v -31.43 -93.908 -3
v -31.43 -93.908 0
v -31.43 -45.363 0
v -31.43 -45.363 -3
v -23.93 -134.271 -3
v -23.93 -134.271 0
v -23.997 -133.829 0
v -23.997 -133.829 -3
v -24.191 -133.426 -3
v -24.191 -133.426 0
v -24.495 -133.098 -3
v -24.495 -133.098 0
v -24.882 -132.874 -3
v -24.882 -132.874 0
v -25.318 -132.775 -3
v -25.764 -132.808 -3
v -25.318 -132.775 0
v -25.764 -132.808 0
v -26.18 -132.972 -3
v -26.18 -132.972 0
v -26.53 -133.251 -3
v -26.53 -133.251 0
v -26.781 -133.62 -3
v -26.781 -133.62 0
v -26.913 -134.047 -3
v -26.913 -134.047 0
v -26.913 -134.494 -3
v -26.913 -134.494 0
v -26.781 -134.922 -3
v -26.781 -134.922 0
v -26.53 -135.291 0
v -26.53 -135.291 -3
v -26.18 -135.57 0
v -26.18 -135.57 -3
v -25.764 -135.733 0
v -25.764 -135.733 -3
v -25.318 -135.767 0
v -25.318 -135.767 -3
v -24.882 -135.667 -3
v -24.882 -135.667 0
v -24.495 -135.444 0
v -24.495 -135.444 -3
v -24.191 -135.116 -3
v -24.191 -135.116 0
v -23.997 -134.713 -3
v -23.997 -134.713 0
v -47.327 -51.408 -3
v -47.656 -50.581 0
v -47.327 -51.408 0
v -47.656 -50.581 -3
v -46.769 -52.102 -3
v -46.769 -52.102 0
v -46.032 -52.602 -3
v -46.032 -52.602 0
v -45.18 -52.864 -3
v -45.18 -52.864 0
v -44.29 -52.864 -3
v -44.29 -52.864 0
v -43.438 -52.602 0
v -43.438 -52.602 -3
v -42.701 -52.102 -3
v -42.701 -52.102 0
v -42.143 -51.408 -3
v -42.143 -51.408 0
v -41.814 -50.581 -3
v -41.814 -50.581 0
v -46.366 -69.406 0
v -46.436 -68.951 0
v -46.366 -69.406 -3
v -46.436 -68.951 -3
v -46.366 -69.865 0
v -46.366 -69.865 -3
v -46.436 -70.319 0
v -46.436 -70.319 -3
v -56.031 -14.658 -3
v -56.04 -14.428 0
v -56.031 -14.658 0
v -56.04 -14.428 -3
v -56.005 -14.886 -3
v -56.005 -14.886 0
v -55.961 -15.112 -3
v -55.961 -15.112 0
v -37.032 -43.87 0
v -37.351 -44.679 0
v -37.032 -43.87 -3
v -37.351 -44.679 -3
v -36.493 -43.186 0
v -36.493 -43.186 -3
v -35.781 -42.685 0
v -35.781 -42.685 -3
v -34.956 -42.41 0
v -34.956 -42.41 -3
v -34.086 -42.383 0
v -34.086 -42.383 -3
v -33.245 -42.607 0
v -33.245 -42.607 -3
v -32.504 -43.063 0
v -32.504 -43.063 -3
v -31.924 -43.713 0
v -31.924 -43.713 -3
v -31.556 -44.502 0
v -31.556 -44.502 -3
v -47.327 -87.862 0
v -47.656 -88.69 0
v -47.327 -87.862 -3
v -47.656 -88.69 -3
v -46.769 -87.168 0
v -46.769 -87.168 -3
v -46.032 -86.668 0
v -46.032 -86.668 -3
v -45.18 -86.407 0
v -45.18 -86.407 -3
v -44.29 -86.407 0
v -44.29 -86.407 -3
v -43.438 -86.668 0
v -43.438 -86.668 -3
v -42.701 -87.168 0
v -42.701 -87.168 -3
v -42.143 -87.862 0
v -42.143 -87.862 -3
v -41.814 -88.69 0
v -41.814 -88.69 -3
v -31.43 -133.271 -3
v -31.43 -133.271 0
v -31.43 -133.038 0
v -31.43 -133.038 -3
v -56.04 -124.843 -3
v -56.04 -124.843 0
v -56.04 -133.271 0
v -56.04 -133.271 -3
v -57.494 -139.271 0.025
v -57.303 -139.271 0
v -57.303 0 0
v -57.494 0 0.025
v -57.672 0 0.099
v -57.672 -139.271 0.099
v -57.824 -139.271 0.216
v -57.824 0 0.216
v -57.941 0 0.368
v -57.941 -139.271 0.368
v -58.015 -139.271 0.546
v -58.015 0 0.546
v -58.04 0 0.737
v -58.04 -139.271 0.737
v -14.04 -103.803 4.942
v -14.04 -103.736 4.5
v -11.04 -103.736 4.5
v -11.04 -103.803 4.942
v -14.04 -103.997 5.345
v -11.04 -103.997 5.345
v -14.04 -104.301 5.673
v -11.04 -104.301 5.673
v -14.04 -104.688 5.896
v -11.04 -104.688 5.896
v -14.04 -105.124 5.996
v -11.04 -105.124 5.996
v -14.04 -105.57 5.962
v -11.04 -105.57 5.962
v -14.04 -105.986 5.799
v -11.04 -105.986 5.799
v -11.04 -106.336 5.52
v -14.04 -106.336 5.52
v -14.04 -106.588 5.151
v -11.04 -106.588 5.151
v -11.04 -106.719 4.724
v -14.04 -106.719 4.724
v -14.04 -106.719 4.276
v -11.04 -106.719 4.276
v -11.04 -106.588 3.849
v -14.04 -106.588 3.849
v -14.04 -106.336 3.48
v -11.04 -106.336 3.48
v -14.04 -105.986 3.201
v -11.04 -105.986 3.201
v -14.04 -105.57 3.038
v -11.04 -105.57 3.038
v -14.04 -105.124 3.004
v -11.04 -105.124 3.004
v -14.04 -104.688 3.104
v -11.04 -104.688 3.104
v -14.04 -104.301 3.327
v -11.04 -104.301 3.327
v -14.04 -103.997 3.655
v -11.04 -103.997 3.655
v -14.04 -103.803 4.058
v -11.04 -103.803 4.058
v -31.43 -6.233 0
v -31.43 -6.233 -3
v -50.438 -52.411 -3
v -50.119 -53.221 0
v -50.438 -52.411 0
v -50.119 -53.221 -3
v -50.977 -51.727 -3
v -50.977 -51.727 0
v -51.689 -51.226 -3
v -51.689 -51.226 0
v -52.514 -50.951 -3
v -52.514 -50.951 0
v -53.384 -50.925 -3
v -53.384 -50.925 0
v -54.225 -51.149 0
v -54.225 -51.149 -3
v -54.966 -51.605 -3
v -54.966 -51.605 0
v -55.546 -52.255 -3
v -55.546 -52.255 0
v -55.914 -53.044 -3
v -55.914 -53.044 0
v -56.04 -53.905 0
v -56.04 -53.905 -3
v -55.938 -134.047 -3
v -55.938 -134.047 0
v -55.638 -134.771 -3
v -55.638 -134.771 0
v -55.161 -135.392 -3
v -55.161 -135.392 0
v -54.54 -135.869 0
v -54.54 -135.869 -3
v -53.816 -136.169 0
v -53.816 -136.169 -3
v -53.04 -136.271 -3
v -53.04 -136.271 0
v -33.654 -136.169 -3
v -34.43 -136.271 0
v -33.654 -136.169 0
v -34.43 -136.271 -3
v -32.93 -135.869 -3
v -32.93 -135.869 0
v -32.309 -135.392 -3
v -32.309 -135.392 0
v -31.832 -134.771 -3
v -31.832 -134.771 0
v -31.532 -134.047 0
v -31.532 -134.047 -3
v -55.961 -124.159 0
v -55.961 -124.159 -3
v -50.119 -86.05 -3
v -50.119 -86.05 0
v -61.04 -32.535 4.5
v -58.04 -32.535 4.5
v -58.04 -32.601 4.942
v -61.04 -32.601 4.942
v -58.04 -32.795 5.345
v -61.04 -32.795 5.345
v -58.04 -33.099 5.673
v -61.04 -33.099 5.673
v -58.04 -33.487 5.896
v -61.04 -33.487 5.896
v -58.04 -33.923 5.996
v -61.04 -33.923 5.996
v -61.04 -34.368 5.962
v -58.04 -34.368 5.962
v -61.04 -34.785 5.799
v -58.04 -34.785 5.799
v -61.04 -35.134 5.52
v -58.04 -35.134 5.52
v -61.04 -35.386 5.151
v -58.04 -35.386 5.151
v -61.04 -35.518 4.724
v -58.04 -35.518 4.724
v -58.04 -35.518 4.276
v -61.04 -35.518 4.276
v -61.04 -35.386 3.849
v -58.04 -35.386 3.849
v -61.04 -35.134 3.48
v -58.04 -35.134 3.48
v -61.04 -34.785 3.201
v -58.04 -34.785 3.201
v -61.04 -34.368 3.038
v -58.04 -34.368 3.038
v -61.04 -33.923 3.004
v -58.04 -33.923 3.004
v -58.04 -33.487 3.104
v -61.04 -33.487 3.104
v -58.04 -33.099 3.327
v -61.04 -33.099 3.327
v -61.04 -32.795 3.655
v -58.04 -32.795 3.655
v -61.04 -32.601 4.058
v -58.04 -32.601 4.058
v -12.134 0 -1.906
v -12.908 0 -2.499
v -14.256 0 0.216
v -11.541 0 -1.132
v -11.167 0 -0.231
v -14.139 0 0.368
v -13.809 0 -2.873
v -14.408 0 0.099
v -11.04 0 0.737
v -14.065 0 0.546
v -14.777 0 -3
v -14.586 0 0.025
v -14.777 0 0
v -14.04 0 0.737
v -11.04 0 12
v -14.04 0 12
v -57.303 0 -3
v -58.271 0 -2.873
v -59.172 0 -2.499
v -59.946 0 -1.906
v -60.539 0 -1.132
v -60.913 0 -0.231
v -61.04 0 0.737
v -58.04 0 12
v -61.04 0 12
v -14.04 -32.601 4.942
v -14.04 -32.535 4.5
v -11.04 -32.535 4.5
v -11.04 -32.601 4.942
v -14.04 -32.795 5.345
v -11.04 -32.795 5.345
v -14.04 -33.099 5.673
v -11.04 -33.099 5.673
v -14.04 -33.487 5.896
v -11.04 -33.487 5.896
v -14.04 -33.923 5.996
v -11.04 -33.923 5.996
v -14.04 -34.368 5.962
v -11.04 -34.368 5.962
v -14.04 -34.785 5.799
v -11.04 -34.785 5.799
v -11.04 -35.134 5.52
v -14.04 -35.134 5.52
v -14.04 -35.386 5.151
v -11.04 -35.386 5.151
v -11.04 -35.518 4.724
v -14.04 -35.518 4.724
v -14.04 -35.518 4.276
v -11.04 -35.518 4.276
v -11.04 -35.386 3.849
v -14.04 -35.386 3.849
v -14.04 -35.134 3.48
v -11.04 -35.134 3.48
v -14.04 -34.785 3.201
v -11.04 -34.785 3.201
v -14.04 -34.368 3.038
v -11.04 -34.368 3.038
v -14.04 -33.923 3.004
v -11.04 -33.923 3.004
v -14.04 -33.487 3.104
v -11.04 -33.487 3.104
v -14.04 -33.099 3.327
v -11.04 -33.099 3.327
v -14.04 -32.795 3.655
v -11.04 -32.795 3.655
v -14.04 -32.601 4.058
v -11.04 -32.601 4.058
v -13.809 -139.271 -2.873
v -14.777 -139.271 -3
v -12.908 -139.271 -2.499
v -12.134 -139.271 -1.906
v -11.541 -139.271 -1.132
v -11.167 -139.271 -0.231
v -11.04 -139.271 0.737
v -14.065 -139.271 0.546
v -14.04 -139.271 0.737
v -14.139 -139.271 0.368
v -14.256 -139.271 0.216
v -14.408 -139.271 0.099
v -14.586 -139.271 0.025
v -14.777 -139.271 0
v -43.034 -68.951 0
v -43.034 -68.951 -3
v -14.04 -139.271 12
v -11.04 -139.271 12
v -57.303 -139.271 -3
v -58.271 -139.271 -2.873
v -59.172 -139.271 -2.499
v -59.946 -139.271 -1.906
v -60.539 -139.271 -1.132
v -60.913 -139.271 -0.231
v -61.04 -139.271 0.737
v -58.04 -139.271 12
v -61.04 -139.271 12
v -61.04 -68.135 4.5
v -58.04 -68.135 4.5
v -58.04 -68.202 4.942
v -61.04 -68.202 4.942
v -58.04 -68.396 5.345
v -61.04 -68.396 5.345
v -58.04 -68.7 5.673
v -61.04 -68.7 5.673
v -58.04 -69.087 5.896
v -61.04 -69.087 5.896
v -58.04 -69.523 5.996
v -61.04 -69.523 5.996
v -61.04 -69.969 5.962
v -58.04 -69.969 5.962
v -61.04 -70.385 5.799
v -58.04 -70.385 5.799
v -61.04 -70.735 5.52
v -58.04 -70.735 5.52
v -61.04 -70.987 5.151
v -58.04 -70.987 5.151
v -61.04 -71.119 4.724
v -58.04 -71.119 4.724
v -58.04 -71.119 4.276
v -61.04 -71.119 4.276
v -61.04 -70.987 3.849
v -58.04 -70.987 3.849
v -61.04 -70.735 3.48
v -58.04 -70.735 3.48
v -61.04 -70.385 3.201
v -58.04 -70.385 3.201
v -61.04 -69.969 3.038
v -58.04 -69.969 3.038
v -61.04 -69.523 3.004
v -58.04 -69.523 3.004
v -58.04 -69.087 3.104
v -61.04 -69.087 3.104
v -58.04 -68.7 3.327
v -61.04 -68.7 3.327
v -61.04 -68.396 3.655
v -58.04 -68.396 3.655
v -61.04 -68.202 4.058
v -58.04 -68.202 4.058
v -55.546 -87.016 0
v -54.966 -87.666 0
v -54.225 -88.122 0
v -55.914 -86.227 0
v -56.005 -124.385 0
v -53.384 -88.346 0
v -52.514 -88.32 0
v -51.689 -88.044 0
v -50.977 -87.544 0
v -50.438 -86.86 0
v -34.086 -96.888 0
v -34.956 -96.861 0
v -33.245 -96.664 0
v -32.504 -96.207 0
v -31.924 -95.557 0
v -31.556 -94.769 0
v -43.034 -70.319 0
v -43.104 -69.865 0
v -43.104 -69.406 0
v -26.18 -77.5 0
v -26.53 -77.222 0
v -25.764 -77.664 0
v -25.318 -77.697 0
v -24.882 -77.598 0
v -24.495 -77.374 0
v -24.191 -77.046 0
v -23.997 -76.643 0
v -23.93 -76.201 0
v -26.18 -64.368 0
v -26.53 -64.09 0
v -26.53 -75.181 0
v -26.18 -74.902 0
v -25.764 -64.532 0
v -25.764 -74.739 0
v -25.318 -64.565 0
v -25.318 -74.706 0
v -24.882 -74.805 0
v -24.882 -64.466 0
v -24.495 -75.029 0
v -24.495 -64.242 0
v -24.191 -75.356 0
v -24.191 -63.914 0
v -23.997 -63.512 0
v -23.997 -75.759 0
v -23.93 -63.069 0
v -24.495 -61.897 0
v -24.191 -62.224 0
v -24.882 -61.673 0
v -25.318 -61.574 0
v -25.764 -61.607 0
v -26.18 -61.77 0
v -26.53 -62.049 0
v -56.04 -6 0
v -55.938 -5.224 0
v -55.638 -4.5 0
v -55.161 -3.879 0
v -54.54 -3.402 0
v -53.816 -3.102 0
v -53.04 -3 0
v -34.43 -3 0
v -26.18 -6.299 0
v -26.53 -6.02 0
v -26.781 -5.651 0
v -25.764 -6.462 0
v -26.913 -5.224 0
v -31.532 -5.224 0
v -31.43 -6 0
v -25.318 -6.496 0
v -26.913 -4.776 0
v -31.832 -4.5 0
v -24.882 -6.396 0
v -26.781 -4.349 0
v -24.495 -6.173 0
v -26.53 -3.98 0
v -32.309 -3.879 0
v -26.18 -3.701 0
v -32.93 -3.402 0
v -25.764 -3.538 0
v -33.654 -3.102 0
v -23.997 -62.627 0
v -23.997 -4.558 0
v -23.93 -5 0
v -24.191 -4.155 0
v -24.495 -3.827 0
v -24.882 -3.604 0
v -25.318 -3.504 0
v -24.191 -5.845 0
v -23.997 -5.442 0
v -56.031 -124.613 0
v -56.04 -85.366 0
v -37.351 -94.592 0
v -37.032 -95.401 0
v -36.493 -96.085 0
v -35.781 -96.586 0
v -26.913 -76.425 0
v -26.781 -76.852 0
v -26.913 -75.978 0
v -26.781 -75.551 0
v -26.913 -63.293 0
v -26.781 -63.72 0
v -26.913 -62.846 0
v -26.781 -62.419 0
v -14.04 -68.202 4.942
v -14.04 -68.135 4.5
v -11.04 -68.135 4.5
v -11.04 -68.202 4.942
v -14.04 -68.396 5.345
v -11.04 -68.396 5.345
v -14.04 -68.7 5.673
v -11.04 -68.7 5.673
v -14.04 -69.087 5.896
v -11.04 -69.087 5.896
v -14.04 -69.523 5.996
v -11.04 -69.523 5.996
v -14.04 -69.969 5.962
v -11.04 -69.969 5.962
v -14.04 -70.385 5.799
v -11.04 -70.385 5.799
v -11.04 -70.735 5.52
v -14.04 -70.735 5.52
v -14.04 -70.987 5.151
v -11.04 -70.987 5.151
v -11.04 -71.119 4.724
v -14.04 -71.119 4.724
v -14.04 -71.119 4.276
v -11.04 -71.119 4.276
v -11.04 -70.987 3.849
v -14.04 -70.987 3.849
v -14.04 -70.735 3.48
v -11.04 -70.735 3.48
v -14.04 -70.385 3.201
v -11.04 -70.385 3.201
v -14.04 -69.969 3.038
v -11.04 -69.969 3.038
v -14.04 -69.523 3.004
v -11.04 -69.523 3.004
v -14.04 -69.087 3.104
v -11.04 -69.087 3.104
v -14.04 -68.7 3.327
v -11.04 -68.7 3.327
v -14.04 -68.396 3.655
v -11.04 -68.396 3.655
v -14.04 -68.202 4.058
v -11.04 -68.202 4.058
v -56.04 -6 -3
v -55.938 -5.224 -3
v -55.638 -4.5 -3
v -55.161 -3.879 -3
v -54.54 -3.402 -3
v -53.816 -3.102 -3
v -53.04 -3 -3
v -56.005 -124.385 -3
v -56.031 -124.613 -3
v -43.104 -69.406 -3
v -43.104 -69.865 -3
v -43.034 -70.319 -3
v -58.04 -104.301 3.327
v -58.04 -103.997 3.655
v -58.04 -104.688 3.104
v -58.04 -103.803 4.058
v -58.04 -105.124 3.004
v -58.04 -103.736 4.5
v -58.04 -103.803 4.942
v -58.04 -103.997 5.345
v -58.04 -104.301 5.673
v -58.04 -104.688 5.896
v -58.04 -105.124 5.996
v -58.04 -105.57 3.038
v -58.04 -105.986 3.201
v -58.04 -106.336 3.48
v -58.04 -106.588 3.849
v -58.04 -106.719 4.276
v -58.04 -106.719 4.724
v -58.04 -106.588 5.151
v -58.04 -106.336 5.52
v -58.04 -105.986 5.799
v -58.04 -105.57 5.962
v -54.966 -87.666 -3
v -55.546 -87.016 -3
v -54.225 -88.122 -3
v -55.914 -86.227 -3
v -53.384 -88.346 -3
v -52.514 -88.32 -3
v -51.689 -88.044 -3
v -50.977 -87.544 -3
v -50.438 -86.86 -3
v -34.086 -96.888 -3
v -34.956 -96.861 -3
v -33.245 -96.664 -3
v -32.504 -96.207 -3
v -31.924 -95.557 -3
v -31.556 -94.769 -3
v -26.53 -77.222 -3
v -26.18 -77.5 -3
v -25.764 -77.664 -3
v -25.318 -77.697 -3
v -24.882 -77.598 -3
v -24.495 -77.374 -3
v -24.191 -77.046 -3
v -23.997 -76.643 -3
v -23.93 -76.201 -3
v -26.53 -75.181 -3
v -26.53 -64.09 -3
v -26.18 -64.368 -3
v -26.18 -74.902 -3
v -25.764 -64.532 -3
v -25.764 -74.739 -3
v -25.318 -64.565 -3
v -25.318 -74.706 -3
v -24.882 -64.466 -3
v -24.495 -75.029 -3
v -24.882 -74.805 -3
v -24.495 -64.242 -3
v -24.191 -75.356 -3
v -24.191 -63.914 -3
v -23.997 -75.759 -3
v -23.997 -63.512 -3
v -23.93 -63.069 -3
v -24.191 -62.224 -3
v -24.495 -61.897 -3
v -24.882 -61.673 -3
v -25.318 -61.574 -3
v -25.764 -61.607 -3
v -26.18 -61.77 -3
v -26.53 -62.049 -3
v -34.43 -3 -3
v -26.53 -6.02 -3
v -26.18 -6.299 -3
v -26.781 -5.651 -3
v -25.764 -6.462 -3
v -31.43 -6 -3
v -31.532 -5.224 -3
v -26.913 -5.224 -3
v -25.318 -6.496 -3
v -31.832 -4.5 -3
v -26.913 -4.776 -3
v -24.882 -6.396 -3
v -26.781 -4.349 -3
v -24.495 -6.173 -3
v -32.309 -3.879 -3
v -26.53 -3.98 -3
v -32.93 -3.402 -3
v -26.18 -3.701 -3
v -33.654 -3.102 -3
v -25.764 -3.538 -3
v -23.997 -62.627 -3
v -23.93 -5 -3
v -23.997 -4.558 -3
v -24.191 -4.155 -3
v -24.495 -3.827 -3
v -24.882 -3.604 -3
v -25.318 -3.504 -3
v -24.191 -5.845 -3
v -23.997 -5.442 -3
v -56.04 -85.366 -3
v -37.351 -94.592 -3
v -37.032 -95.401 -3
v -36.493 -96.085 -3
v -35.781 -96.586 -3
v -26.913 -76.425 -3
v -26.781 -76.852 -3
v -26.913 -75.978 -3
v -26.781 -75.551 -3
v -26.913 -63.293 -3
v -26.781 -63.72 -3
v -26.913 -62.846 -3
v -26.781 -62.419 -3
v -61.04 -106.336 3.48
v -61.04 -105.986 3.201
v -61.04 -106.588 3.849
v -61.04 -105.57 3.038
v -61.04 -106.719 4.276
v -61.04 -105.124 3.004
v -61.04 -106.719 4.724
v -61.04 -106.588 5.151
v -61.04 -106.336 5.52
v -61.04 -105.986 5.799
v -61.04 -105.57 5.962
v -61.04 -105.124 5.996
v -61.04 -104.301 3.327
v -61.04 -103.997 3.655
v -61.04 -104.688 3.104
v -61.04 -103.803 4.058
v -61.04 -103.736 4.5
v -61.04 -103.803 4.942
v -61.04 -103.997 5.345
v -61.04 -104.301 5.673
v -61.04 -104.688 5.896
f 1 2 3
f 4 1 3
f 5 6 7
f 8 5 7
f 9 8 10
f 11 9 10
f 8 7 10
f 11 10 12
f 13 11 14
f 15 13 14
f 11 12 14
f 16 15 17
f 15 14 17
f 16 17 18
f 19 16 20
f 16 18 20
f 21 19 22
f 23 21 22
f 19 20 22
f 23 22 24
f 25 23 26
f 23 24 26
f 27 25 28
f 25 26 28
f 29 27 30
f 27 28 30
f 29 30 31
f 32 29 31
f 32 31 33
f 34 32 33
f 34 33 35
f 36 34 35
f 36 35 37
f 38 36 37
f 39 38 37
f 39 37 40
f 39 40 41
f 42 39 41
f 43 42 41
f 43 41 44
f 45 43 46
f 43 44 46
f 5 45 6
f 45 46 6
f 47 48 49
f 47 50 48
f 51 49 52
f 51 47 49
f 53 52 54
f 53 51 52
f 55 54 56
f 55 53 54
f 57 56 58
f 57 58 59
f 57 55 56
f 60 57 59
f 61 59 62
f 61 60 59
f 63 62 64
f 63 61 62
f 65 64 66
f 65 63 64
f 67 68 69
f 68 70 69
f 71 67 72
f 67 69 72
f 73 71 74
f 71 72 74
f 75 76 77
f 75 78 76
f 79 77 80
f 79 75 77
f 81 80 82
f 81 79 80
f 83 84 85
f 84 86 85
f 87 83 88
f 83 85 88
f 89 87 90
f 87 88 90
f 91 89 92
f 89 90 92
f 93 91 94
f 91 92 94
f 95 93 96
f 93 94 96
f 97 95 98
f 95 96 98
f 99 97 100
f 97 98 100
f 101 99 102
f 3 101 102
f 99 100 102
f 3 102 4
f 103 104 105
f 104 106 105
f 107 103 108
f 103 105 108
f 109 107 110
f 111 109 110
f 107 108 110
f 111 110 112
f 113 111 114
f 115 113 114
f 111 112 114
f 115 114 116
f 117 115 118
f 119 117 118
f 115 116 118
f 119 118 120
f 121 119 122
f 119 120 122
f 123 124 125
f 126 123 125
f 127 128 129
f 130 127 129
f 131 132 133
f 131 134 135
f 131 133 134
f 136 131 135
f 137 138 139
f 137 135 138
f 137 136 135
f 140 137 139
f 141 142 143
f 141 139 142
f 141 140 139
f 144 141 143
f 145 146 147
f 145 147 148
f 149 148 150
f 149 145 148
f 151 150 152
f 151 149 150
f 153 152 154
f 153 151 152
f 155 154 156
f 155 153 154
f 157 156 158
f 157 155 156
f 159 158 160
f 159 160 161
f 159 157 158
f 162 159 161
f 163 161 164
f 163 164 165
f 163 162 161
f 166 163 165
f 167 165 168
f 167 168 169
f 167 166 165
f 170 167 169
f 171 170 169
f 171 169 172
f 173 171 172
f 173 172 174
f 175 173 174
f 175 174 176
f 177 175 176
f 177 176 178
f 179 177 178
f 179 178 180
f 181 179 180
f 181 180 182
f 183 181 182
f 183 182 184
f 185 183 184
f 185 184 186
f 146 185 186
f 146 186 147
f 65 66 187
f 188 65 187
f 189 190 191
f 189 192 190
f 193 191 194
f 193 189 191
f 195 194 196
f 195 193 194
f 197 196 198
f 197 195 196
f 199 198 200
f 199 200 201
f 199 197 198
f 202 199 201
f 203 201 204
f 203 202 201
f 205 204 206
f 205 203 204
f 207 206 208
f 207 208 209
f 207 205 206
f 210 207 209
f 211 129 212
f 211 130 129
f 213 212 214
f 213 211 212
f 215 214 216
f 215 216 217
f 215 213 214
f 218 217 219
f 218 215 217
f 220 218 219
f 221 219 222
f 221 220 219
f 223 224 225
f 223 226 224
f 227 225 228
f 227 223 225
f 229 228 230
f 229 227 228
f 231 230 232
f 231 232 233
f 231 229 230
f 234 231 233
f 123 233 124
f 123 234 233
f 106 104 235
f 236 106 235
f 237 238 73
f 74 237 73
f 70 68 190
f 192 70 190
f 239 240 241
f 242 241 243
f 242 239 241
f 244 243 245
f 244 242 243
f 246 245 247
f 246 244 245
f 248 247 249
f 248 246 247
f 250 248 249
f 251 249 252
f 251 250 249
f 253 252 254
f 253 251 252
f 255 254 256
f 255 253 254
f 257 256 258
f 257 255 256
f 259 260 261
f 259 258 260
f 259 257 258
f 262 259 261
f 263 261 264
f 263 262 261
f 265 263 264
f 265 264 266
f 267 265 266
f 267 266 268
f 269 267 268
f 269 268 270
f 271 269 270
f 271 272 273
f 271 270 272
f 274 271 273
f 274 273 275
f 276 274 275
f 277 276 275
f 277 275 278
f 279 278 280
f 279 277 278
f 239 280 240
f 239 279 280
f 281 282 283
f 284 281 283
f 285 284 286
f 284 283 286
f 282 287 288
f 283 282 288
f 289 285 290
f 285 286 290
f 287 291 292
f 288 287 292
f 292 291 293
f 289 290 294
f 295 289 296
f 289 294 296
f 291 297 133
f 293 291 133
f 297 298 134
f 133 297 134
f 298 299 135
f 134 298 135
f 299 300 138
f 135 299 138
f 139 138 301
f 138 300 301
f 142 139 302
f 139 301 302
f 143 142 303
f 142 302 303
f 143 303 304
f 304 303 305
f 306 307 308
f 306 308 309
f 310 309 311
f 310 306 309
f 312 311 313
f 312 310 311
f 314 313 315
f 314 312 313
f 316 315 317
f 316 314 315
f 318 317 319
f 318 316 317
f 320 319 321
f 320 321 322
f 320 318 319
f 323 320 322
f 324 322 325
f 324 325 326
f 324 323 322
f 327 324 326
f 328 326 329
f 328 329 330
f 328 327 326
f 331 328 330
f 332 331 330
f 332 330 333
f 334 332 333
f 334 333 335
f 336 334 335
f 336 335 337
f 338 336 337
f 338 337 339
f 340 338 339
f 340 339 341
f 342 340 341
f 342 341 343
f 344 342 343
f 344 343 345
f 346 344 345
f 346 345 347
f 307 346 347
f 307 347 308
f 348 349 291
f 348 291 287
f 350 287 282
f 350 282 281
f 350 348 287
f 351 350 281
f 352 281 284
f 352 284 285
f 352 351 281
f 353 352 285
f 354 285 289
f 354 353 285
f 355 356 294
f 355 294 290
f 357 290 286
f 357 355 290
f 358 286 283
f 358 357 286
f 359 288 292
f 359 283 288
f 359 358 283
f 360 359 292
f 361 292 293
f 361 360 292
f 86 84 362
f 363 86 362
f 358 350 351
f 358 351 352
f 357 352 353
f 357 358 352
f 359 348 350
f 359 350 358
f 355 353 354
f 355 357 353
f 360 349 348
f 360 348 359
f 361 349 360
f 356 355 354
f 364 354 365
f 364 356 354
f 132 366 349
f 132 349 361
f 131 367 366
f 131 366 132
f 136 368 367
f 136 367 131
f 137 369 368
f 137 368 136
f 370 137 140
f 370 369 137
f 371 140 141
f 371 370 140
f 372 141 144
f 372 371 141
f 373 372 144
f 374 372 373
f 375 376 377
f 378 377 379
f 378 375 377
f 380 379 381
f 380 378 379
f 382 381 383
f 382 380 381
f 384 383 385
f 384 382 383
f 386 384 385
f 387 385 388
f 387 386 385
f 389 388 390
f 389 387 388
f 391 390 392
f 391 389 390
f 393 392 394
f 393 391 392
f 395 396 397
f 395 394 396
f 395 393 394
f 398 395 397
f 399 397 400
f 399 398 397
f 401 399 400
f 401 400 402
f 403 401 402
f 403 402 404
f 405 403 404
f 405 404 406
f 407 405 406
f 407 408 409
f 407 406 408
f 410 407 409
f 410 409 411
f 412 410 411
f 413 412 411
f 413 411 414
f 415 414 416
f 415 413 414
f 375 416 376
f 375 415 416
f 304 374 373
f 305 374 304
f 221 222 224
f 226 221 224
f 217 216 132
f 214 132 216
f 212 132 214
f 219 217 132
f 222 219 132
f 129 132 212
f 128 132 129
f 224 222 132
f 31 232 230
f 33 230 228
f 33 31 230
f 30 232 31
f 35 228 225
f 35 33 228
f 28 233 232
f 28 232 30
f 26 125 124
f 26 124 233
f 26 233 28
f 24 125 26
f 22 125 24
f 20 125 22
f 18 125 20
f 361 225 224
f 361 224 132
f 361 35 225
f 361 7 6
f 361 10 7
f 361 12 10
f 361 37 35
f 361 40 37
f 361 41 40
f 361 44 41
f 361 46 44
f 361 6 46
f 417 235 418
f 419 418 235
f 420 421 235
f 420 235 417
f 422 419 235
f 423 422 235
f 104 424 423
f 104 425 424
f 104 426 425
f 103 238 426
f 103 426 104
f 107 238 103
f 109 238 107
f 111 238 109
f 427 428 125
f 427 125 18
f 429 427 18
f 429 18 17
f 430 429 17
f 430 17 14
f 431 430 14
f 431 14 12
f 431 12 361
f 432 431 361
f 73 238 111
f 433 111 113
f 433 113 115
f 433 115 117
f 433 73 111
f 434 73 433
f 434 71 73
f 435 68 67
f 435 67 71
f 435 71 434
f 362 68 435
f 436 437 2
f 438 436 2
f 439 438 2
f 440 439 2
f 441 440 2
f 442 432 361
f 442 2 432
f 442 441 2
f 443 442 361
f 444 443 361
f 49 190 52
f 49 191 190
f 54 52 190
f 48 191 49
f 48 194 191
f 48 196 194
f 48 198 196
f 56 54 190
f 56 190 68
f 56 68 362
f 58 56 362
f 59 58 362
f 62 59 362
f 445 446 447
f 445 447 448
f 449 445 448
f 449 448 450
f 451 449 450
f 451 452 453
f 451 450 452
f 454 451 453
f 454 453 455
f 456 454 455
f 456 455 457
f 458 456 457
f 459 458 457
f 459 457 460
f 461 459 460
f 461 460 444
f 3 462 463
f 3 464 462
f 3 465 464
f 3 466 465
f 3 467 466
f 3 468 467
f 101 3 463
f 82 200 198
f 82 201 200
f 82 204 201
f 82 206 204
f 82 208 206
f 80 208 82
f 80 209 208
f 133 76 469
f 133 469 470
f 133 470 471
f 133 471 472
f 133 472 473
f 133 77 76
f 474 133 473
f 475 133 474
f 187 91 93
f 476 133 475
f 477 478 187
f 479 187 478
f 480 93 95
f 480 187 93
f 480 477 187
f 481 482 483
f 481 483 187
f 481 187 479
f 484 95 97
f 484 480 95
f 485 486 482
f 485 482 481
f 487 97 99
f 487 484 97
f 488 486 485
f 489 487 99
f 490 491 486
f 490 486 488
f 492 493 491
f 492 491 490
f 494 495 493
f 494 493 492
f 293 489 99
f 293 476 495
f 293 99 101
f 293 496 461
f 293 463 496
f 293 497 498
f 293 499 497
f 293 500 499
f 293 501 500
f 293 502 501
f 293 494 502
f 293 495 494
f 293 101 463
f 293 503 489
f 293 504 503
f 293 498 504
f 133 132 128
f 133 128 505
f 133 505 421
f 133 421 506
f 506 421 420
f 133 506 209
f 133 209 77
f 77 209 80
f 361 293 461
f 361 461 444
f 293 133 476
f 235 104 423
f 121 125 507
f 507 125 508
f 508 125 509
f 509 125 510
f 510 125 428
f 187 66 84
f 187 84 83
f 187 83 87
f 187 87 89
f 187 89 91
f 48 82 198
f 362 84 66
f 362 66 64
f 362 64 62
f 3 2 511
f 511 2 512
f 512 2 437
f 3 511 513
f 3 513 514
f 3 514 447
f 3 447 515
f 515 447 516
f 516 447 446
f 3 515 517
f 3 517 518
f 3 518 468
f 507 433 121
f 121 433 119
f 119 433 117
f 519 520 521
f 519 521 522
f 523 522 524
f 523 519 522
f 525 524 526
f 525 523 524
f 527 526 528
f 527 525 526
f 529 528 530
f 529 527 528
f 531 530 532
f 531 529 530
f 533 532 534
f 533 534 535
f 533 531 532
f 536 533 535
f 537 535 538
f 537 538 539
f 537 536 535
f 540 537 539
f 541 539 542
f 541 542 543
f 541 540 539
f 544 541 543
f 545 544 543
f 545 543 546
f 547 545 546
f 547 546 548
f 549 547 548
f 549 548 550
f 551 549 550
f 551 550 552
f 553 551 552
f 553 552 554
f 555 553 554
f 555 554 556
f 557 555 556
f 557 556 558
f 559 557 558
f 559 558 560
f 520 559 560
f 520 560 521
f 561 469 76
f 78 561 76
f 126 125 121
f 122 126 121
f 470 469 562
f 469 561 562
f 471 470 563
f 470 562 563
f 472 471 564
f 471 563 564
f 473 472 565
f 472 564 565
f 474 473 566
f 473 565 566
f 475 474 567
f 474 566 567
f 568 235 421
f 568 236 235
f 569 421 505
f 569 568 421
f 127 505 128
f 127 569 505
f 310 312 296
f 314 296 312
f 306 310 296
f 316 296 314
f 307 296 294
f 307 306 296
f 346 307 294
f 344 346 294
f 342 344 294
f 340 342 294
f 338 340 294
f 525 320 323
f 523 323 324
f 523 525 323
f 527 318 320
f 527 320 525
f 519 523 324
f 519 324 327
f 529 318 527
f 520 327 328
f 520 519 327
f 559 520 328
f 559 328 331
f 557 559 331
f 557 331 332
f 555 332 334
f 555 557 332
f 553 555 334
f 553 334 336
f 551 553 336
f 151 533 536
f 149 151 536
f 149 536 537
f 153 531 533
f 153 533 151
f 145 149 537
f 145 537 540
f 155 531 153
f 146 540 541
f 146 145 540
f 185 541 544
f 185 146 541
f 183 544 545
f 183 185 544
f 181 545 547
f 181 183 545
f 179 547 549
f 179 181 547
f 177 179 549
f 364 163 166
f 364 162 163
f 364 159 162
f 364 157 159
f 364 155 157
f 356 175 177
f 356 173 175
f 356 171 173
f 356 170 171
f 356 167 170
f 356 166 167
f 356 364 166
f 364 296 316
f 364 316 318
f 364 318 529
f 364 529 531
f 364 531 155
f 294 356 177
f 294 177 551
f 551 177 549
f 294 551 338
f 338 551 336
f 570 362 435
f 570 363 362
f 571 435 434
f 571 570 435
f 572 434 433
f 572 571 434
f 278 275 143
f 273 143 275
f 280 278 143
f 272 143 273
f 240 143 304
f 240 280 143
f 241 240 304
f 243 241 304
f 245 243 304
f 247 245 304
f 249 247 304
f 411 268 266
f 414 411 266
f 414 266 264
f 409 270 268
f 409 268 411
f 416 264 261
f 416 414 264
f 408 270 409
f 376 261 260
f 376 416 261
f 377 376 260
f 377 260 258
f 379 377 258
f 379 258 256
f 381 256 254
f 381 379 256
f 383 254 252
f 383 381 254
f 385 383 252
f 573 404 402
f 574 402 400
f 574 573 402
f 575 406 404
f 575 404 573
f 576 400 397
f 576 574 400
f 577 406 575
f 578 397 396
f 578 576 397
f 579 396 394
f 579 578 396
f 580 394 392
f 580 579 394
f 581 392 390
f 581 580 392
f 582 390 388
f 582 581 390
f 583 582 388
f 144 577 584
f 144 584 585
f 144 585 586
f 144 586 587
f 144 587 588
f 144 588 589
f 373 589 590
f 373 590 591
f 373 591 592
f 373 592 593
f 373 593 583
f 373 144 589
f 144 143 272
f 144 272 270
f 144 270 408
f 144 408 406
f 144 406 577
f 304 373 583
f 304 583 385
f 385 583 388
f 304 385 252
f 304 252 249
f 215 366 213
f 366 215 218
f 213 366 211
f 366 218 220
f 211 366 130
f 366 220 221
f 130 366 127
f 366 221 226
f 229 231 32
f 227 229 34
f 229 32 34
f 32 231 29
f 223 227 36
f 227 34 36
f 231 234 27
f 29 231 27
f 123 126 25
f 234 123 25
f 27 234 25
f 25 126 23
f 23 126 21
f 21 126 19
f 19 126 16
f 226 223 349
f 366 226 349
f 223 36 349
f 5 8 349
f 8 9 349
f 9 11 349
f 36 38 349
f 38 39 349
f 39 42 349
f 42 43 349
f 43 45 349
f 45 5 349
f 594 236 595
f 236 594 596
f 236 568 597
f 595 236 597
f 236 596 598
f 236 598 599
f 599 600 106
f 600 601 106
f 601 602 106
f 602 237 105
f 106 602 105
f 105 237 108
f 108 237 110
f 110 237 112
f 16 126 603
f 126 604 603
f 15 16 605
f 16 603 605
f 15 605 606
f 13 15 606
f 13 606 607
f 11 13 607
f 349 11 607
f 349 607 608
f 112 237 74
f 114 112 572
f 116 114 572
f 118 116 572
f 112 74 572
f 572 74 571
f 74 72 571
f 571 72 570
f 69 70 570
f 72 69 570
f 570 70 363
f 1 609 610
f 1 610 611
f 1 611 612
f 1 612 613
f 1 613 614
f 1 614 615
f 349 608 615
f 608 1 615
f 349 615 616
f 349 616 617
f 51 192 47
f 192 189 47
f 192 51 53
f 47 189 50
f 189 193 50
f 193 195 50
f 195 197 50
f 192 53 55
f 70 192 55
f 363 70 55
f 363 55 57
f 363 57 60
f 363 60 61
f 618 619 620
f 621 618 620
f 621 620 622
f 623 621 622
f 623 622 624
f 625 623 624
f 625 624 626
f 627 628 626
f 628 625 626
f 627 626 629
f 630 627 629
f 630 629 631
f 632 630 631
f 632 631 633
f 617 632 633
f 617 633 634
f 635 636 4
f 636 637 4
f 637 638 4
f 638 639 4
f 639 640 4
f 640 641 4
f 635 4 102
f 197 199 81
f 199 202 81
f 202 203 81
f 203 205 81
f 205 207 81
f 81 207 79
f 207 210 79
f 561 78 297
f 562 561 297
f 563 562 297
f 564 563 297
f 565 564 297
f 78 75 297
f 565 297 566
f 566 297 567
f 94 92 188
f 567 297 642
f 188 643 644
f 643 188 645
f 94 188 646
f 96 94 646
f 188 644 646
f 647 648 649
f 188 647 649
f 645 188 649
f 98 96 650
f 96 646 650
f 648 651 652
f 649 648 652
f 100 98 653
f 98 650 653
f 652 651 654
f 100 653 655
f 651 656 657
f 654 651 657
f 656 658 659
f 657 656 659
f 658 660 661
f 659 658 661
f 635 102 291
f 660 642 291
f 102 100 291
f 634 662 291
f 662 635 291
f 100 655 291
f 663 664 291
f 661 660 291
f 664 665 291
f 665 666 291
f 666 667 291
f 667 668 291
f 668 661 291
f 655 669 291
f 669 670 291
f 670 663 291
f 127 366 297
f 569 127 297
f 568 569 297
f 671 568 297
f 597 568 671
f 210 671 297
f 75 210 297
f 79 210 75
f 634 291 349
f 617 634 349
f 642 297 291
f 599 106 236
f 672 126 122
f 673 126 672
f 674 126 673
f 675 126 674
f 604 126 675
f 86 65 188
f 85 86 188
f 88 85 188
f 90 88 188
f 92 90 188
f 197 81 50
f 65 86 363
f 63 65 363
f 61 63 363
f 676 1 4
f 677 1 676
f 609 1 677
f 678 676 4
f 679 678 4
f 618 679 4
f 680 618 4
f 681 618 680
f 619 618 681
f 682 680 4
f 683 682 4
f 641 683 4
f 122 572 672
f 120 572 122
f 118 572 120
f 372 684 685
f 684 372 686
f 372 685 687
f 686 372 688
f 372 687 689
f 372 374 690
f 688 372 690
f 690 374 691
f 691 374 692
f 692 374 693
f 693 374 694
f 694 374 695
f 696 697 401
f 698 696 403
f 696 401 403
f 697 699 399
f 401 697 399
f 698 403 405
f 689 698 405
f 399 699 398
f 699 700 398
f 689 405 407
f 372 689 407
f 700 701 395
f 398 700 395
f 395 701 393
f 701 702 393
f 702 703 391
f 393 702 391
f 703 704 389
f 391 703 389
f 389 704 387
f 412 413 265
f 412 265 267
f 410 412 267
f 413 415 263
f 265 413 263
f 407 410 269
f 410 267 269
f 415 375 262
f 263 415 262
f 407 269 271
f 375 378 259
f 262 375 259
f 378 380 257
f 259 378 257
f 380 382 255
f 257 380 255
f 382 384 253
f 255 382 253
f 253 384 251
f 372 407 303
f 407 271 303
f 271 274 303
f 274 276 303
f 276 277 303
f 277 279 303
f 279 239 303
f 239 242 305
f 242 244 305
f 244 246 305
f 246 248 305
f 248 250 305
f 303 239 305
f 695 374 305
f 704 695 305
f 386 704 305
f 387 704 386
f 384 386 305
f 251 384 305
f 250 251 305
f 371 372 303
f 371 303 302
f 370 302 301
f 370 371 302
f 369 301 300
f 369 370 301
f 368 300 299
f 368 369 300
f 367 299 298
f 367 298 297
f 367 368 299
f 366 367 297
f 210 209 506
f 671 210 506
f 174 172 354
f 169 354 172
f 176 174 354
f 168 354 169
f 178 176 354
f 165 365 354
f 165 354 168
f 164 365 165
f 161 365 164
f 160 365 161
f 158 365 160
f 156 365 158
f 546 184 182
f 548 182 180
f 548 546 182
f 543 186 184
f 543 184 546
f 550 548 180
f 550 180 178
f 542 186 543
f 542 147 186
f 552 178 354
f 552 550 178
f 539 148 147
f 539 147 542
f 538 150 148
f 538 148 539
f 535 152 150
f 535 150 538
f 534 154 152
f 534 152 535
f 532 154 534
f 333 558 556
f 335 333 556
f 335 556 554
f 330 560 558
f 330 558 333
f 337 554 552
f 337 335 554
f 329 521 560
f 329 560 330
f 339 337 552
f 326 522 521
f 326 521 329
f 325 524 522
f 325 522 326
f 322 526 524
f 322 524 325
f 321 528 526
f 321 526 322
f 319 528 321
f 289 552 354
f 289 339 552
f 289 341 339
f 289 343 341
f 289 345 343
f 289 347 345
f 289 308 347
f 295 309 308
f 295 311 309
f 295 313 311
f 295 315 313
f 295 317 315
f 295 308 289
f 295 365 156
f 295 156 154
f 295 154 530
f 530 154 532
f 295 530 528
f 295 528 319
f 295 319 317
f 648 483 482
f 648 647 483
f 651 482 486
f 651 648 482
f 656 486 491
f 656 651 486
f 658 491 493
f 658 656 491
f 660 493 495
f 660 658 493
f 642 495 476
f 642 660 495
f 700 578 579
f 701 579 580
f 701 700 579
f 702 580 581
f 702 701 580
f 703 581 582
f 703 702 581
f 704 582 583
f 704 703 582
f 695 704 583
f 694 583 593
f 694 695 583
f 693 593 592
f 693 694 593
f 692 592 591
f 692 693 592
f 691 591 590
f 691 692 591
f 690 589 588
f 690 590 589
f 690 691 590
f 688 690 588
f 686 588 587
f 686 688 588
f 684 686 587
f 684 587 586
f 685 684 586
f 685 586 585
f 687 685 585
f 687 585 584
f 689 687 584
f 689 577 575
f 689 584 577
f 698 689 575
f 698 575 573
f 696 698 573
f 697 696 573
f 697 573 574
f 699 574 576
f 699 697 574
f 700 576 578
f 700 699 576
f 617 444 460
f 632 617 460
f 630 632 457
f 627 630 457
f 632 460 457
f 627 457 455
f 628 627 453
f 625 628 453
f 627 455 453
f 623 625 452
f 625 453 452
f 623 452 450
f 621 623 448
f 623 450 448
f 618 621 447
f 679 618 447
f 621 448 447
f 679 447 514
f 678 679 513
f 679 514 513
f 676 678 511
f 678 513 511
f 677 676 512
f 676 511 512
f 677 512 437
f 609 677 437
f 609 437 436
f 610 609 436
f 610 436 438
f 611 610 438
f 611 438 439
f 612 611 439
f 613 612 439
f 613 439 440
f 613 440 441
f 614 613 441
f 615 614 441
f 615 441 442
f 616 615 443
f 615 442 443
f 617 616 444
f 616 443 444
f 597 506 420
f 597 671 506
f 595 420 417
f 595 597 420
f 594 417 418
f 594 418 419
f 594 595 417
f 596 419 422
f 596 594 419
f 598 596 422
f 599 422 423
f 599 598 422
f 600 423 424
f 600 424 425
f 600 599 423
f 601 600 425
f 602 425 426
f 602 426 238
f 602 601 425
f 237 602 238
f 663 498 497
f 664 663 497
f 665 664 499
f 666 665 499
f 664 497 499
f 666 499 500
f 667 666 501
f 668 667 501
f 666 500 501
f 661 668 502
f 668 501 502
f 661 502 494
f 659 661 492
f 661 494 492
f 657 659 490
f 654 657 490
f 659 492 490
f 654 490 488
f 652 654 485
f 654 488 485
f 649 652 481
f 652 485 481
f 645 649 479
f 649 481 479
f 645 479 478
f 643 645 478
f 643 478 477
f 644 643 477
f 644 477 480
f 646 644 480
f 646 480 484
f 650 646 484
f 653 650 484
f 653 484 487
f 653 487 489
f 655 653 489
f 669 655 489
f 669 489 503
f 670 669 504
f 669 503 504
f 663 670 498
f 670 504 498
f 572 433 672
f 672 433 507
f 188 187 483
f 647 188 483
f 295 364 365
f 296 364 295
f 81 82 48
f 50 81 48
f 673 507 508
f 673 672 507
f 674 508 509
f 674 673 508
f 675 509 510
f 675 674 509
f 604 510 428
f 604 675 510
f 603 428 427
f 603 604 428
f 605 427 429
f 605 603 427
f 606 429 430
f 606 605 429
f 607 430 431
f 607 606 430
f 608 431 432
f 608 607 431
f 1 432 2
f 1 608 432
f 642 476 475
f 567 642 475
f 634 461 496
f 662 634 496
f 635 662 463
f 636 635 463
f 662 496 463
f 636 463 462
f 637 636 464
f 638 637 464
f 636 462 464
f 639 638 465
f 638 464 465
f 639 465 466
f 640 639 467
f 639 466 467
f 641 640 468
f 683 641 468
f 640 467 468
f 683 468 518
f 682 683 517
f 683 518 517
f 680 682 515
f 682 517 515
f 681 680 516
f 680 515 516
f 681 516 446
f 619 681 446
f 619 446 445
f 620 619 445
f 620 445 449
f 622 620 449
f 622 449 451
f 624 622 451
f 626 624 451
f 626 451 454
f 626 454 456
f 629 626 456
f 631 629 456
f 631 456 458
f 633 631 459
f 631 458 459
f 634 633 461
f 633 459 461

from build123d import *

# Parameters (mm, degrees)
SKETCH1_R                  = 1.5
BASE_FLANGE2_DEPTH         = 3
CUT_EXTRUDE1_DEPTH         = 3
FILLET2_R                  = 3
SKETCHED_START             = -72.08
SKETCHED_BEND2_OUTLINE_W   = 139.27076518
SKETCHED_BEND2_OUTLINE_H   = 3
SKETCHED_BEND2_DEPTH       = 11.04
SKETCHED_START_2           = -11.04
SKETCHED_BEND2_2_OUTLINE_W = 139.27076518
SKETCHED_BEND2_2_OUTLINE_H = 3
SKETCHED_BEND2_2_DEPTH     = 11.04
SKETCHED_START_3           = -60.687339692
SKETCHED_BEND2_3_OUTLINE_W = 139.27076518
SKETCHED_BEND2_3_OUTLINE_H = 11.999956935
SKETCHED_BEND2_3_OUTLINE_R = 1.5
SKETCHED_BEND2_3_DEPTH     = 2.647339692
SKETCHED_START_4           = -14.04
SKETCHED_BEND2_4_OUTLINE_W = 139.27076518
SKETCHED_BEND2_4_OUTLINE_H = 11.999956935
SKETCHED_BEND2_4_OUTLINE_R = 1.5
SKETCHED_BEND2_4_DEPTH     = 2.616101716
SKETCHED_START_5           = -14.7766
SKETCHED_BEND2_5_OUTLINE_W = 139.27076518
SKETCHED_BEND2_5_OUTLINE_H = 11.999956935
SKETCHED_BEND2_5_OUTLINE_R = 1.5
SKETCHED_BEND2_5_DEPTH     = 3.7366
SKETCHED_START_6           = -61.04
SKETCHED_BEND2_6_OUTLINE_W = 139.27076518
SKETCHED_BEND2_6_OUTLINE_H = 11.999956935
SKETCHED_BEND2_6_OUTLINE_R = 1.5
SKETCHED_BEND2_6_DEPTH     = 3.7366
SKETCHED_START_7           = -140
SKETCHED_BEND2_7_DEPTH     = 141


with BuildPart() as part:
    # Base-Flange2: sheet metal written as solids
    # Sketch1 → Base-Flange2 (new body)
    with BuildSketch(Plane.XY):
        Polygon((-72.08, -139.27076518), (-28.43, -139.27076518), (-22.43, -139.27076518), (0, -139.27076518), (0, 0), (-22.43, 0), (-28.43, 0), (-72.08, 0), align=None)
        with Locations((-25.43, -134.27076518)):
            Circle(SKETCH1_R, mode=Mode.SUBTRACT)
        with Locations((-25.43, -76.20135678)):
            Circle(SKETCH1_R, mode=Mode.SUBTRACT)
        with Locations((-25.43, -63.0694084)):
            Circle(SKETCH1_R, mode=Mode.SUBTRACT)
        with Locations((-25.43, -5)):
            Circle(SKETCH1_R, mode=Mode.SUBTRACT)
        with Locations((-64.58, -69.63538259)):
            Circle(SKETCH1_R, mode=Mode.SUBTRACT)
        with Locations((-64.58, -105.23606098)):
            Circle(SKETCH1_R, mode=Mode.SUBTRACT)
        with Locations((-64.58, -34.0347042)):
            Circle(SKETCH1_R, mode=Mode.SUBTRACT)
        with Locations(Location((-7.5, -105.23606098, 0), (0, 0, 180))):
            Circle(SKETCH1_R, mode=Mode.SUBTRACT)
        with Locations(Location((-7.5, -69.63538259, 0), (0, 0, 180))):
            Circle(SKETCH1_R, mode=Mode.SUBTRACT)
        with Locations(Location((-7.5, -34.0347042, 0), (0, 0, 180))):
            Circle(SKETCH1_R, mode=Mode.SUBTRACT)
    extrude(amount=-BASE_FLANGE2_DEPTH)

    # Sketch16 → Cut-Extrude1 (cut)
    with BuildSketch(Plane.XY):
        Polygon((-56.04, -3), (-56.04, -14.774529578), (-44.735, -63.055915667), (-31.43, -6.232930978), (-31.43, -3), align=None)
        Polygon((-31.43, -19.391864824), (-43.194429615, -69.63538259), (-31.43, -119.878900356), align=None)
        Polygon((-46.275570385, -69.63538259), (-56.04, -27.933463424), (-56.04, -111.337301756), align=None)
        Polygon((-44.735, -76.214849513), (-56.04, -124.496235602), (-56.04, -136.27076518), (-31.43, -136.27076518), (-31.43, -133.037834202), align=None)
    extrude(amount=-CUT_EXTRUDE1_DEPTH, mode=Mode.SUBTRACT)

    # Fillet2
    fillet2_edges = [part.edges().sort_by_distance(p)[0] for p in [
        (-31.43, -136.27076518, -1.5),
        (-44.735, -76.214849513, -1.5),
        (-56.04, -124.496235602, -1.5),
        (-56.04, -136.27076518, -1.5),
        (-56.04, -3, -1.5),
        (-56.04, -14.774529578, -1.5),
        (-44.735, -63.055915667, -1.5),
        (-31.43, -3, -1.5),
        (-31.43, -19.391864824, -1.5),
        (-43.194429615, -69.63538259, -1.5),
        (-31.43, -119.878900356, -1.5),
        (-56.04, -111.337301756, -1.5),
        (-46.275570385, -69.63538259, -1.5),
        (-56.04, -27.933463424, -1.5),
    ]]
    fillet(fillet2_edges, radius=FILLET2_R)

    # Sketched Bend2: read off the stored shape, not the designer's step
    # Sketched Bend2 outline → Sketched Bend2 (cut)
    with BuildSketch(Plane.YZ.offset(SKETCHED_START)):
        with Locations((-69.63538259, -1.5)):
            Rectangle(SKETCHED_BEND2_OUTLINE_W, SKETCHED_BEND2_OUTLINE_H)
    extrude(amount=SKETCHED_BEND2_DEPTH, mode=Mode.SUBTRACT)

    # Sketched Bend2 2 outline → Sketched Bend2 2 (cut)
    with BuildSketch(Plane.YZ.offset(SKETCHED_START_2)):
        with Locations((-69.63538259, -1.5)):
            Rectangle(SKETCHED_BEND2_2_OUTLINE_W, SKETCHED_BEND2_2_OUTLINE_H)
    extrude(amount=SKETCHED_BEND2_2_DEPTH, mode=Mode.SUBTRACT)

    # Sketched Bend2 3 outline → Sketched Bend2 3 (add)
    with BuildSketch(Plane.YZ.offset(SKETCHED_START_3)):
        with Locations((-69.63538259, 5.999978468)):
            Rectangle(SKETCHED_BEND2_3_OUTLINE_W, SKETCHED_BEND2_3_OUTLINE_H)
        with Locations((-105.23606098, 4.499956935)):
            Circle(SKETCHED_BEND2_3_OUTLINE_R, mode=Mode.SUBTRACT)
        with Locations((-69.63538259, 4.499956935)):
            Circle(SKETCHED_BEND2_3_OUTLINE_R, mode=Mode.SUBTRACT)
        with Locations((-34.0347042, 4.499956935)):
            Circle(SKETCHED_BEND2_3_OUTLINE_R, mode=Mode.SUBTRACT)
    extrude(amount=SKETCHED_BEND2_3_DEPTH)

    # Sketched Bend2 4 outline → Sketched Bend2 4 (add)
    with BuildSketch(Plane.YZ.offset(SKETCHED_START_4)):
        with Locations((-69.63538259, 5.999978468)):
            Rectangle(SKETCHED_BEND2_4_OUTLINE_W, SKETCHED_BEND2_4_OUTLINE_H)
        with Locations((-105.23606098, 4.499956935)):
            Circle(SKETCHED_BEND2_4_OUTLINE_R, mode=Mode.SUBTRACT)
        with Locations((-69.63538259, 4.499956935)):
            Circle(SKETCHED_BEND2_4_OUTLINE_R, mode=Mode.SUBTRACT)
        with Locations((-34.0347042, 4.499956935)):
            Circle(SKETCHED_BEND2_4_OUTLINE_R, mode=Mode.SUBTRACT)
    extrude(amount=SKETCHED_BEND2_4_DEPTH)

    # Sketched Bend2 5 outline → Sketched Bend2 5 (add)
    with BuildSketch(Plane.YZ.offset(SKETCHED_START_5)):
        with Locations((-69.63538259, 5.999978468)):
            Rectangle(SKETCHED_BEND2_5_OUTLINE_W, SKETCHED_BEND2_5_OUTLINE_H)
        with Locations((-105.23606098, 4.499956935)):
            Circle(SKETCHED_BEND2_5_OUTLINE_R, mode=Mode.SUBTRACT)
        with Locations((-69.63538259, 4.499956935)):
            Circle(SKETCHED_BEND2_5_OUTLINE_R, mode=Mode.SUBTRACT)
        with Locations((-34.0347042, 4.499956935)):
            Circle(SKETCHED_BEND2_5_OUTLINE_R, mode=Mode.SUBTRACT)
    extrude(amount=SKETCHED_BEND2_5_DEPTH)

    # Sketched Bend2 6 outline → Sketched Bend2 6 (add)
    with BuildSketch(Plane.YZ.offset(SKETCHED_START_6)):
        with Locations((-69.63538259, 5.999978468)):
            Rectangle(SKETCHED_BEND2_6_OUTLINE_W, SKETCHED_BEND2_6_OUTLINE_H)
        with Locations((-105.23606098, 4.499956935)):
            Circle(SKETCHED_BEND2_6_OUTLINE_R, mode=Mode.SUBTRACT)
        with Locations((-69.63538259, 4.499956935)):
            Circle(SKETCHED_BEND2_6_OUTLINE_R, mode=Mode.SUBTRACT)
        with Locations((-34.0347042, 4.499956935)):
            Circle(SKETCHED_BEND2_6_OUTLINE_R, mode=Mode.SUBTRACT)
    extrude(amount=SKETCHED_BEND2_6_DEPTH)

    # Sketched Bend2 7 outline → Sketched Bend2 7 (cut)
    with BuildSketch(Plane(origin=(0, 0, 0), x_dir=(1, 0, 0), z_dir=(0, 1, 0)).offset(SKETCHED_START_7)):
        with BuildLine():
            Line((-58.04, -0.7366), (-58.04, -11.999956935))
            Line((-58.04, -11.999956935), (-57.3034, -11.999956935))
            Line((-57.3034, -11.999956935), (-57.3034, 0))
            ThreePointArc((-57.3034, 0), (-57.824254855, -0.215745145), (-58.04, -0.7366))
        make_face()
        with BuildLine():
            Line((-14.7766, -11.999956935), (-14.04, -11.999956935))
            Line((-14.04, -11.999956935), (-14.04, -0.7366))
            ThreePointArc((-14.04, -0.7366), (-14.255745145, -0.215745145), (-14.7766, 0))
            Line((-14.7766, 0), (-14.7766, -11.999956935))
        make_face()
        with BuildLine():
            Line((-11.04, 3), (-14.7766, 3))
            ThreePointArc((-14.7766, 3), (-12.134424801, 1.905575199), (-11.04, -0.7366))
            Line((-11.04, -0.7366), (-11.04, 3))
        make_face()
        with BuildLine():
            ThreePointArc((-61.04, -0.7366), (-59.945575199, 1.905575199), (-57.3034, 3))
            Line((-57.3034, 3), (-61.04, 3))
            Line((-61.04, 3), (-61.04, -0.7366))
        make_face()
    extrude(amount=SKETCHED_BEND2_7_DEPTH, mode=Mode.SUBTRACT)


solid = part.part
